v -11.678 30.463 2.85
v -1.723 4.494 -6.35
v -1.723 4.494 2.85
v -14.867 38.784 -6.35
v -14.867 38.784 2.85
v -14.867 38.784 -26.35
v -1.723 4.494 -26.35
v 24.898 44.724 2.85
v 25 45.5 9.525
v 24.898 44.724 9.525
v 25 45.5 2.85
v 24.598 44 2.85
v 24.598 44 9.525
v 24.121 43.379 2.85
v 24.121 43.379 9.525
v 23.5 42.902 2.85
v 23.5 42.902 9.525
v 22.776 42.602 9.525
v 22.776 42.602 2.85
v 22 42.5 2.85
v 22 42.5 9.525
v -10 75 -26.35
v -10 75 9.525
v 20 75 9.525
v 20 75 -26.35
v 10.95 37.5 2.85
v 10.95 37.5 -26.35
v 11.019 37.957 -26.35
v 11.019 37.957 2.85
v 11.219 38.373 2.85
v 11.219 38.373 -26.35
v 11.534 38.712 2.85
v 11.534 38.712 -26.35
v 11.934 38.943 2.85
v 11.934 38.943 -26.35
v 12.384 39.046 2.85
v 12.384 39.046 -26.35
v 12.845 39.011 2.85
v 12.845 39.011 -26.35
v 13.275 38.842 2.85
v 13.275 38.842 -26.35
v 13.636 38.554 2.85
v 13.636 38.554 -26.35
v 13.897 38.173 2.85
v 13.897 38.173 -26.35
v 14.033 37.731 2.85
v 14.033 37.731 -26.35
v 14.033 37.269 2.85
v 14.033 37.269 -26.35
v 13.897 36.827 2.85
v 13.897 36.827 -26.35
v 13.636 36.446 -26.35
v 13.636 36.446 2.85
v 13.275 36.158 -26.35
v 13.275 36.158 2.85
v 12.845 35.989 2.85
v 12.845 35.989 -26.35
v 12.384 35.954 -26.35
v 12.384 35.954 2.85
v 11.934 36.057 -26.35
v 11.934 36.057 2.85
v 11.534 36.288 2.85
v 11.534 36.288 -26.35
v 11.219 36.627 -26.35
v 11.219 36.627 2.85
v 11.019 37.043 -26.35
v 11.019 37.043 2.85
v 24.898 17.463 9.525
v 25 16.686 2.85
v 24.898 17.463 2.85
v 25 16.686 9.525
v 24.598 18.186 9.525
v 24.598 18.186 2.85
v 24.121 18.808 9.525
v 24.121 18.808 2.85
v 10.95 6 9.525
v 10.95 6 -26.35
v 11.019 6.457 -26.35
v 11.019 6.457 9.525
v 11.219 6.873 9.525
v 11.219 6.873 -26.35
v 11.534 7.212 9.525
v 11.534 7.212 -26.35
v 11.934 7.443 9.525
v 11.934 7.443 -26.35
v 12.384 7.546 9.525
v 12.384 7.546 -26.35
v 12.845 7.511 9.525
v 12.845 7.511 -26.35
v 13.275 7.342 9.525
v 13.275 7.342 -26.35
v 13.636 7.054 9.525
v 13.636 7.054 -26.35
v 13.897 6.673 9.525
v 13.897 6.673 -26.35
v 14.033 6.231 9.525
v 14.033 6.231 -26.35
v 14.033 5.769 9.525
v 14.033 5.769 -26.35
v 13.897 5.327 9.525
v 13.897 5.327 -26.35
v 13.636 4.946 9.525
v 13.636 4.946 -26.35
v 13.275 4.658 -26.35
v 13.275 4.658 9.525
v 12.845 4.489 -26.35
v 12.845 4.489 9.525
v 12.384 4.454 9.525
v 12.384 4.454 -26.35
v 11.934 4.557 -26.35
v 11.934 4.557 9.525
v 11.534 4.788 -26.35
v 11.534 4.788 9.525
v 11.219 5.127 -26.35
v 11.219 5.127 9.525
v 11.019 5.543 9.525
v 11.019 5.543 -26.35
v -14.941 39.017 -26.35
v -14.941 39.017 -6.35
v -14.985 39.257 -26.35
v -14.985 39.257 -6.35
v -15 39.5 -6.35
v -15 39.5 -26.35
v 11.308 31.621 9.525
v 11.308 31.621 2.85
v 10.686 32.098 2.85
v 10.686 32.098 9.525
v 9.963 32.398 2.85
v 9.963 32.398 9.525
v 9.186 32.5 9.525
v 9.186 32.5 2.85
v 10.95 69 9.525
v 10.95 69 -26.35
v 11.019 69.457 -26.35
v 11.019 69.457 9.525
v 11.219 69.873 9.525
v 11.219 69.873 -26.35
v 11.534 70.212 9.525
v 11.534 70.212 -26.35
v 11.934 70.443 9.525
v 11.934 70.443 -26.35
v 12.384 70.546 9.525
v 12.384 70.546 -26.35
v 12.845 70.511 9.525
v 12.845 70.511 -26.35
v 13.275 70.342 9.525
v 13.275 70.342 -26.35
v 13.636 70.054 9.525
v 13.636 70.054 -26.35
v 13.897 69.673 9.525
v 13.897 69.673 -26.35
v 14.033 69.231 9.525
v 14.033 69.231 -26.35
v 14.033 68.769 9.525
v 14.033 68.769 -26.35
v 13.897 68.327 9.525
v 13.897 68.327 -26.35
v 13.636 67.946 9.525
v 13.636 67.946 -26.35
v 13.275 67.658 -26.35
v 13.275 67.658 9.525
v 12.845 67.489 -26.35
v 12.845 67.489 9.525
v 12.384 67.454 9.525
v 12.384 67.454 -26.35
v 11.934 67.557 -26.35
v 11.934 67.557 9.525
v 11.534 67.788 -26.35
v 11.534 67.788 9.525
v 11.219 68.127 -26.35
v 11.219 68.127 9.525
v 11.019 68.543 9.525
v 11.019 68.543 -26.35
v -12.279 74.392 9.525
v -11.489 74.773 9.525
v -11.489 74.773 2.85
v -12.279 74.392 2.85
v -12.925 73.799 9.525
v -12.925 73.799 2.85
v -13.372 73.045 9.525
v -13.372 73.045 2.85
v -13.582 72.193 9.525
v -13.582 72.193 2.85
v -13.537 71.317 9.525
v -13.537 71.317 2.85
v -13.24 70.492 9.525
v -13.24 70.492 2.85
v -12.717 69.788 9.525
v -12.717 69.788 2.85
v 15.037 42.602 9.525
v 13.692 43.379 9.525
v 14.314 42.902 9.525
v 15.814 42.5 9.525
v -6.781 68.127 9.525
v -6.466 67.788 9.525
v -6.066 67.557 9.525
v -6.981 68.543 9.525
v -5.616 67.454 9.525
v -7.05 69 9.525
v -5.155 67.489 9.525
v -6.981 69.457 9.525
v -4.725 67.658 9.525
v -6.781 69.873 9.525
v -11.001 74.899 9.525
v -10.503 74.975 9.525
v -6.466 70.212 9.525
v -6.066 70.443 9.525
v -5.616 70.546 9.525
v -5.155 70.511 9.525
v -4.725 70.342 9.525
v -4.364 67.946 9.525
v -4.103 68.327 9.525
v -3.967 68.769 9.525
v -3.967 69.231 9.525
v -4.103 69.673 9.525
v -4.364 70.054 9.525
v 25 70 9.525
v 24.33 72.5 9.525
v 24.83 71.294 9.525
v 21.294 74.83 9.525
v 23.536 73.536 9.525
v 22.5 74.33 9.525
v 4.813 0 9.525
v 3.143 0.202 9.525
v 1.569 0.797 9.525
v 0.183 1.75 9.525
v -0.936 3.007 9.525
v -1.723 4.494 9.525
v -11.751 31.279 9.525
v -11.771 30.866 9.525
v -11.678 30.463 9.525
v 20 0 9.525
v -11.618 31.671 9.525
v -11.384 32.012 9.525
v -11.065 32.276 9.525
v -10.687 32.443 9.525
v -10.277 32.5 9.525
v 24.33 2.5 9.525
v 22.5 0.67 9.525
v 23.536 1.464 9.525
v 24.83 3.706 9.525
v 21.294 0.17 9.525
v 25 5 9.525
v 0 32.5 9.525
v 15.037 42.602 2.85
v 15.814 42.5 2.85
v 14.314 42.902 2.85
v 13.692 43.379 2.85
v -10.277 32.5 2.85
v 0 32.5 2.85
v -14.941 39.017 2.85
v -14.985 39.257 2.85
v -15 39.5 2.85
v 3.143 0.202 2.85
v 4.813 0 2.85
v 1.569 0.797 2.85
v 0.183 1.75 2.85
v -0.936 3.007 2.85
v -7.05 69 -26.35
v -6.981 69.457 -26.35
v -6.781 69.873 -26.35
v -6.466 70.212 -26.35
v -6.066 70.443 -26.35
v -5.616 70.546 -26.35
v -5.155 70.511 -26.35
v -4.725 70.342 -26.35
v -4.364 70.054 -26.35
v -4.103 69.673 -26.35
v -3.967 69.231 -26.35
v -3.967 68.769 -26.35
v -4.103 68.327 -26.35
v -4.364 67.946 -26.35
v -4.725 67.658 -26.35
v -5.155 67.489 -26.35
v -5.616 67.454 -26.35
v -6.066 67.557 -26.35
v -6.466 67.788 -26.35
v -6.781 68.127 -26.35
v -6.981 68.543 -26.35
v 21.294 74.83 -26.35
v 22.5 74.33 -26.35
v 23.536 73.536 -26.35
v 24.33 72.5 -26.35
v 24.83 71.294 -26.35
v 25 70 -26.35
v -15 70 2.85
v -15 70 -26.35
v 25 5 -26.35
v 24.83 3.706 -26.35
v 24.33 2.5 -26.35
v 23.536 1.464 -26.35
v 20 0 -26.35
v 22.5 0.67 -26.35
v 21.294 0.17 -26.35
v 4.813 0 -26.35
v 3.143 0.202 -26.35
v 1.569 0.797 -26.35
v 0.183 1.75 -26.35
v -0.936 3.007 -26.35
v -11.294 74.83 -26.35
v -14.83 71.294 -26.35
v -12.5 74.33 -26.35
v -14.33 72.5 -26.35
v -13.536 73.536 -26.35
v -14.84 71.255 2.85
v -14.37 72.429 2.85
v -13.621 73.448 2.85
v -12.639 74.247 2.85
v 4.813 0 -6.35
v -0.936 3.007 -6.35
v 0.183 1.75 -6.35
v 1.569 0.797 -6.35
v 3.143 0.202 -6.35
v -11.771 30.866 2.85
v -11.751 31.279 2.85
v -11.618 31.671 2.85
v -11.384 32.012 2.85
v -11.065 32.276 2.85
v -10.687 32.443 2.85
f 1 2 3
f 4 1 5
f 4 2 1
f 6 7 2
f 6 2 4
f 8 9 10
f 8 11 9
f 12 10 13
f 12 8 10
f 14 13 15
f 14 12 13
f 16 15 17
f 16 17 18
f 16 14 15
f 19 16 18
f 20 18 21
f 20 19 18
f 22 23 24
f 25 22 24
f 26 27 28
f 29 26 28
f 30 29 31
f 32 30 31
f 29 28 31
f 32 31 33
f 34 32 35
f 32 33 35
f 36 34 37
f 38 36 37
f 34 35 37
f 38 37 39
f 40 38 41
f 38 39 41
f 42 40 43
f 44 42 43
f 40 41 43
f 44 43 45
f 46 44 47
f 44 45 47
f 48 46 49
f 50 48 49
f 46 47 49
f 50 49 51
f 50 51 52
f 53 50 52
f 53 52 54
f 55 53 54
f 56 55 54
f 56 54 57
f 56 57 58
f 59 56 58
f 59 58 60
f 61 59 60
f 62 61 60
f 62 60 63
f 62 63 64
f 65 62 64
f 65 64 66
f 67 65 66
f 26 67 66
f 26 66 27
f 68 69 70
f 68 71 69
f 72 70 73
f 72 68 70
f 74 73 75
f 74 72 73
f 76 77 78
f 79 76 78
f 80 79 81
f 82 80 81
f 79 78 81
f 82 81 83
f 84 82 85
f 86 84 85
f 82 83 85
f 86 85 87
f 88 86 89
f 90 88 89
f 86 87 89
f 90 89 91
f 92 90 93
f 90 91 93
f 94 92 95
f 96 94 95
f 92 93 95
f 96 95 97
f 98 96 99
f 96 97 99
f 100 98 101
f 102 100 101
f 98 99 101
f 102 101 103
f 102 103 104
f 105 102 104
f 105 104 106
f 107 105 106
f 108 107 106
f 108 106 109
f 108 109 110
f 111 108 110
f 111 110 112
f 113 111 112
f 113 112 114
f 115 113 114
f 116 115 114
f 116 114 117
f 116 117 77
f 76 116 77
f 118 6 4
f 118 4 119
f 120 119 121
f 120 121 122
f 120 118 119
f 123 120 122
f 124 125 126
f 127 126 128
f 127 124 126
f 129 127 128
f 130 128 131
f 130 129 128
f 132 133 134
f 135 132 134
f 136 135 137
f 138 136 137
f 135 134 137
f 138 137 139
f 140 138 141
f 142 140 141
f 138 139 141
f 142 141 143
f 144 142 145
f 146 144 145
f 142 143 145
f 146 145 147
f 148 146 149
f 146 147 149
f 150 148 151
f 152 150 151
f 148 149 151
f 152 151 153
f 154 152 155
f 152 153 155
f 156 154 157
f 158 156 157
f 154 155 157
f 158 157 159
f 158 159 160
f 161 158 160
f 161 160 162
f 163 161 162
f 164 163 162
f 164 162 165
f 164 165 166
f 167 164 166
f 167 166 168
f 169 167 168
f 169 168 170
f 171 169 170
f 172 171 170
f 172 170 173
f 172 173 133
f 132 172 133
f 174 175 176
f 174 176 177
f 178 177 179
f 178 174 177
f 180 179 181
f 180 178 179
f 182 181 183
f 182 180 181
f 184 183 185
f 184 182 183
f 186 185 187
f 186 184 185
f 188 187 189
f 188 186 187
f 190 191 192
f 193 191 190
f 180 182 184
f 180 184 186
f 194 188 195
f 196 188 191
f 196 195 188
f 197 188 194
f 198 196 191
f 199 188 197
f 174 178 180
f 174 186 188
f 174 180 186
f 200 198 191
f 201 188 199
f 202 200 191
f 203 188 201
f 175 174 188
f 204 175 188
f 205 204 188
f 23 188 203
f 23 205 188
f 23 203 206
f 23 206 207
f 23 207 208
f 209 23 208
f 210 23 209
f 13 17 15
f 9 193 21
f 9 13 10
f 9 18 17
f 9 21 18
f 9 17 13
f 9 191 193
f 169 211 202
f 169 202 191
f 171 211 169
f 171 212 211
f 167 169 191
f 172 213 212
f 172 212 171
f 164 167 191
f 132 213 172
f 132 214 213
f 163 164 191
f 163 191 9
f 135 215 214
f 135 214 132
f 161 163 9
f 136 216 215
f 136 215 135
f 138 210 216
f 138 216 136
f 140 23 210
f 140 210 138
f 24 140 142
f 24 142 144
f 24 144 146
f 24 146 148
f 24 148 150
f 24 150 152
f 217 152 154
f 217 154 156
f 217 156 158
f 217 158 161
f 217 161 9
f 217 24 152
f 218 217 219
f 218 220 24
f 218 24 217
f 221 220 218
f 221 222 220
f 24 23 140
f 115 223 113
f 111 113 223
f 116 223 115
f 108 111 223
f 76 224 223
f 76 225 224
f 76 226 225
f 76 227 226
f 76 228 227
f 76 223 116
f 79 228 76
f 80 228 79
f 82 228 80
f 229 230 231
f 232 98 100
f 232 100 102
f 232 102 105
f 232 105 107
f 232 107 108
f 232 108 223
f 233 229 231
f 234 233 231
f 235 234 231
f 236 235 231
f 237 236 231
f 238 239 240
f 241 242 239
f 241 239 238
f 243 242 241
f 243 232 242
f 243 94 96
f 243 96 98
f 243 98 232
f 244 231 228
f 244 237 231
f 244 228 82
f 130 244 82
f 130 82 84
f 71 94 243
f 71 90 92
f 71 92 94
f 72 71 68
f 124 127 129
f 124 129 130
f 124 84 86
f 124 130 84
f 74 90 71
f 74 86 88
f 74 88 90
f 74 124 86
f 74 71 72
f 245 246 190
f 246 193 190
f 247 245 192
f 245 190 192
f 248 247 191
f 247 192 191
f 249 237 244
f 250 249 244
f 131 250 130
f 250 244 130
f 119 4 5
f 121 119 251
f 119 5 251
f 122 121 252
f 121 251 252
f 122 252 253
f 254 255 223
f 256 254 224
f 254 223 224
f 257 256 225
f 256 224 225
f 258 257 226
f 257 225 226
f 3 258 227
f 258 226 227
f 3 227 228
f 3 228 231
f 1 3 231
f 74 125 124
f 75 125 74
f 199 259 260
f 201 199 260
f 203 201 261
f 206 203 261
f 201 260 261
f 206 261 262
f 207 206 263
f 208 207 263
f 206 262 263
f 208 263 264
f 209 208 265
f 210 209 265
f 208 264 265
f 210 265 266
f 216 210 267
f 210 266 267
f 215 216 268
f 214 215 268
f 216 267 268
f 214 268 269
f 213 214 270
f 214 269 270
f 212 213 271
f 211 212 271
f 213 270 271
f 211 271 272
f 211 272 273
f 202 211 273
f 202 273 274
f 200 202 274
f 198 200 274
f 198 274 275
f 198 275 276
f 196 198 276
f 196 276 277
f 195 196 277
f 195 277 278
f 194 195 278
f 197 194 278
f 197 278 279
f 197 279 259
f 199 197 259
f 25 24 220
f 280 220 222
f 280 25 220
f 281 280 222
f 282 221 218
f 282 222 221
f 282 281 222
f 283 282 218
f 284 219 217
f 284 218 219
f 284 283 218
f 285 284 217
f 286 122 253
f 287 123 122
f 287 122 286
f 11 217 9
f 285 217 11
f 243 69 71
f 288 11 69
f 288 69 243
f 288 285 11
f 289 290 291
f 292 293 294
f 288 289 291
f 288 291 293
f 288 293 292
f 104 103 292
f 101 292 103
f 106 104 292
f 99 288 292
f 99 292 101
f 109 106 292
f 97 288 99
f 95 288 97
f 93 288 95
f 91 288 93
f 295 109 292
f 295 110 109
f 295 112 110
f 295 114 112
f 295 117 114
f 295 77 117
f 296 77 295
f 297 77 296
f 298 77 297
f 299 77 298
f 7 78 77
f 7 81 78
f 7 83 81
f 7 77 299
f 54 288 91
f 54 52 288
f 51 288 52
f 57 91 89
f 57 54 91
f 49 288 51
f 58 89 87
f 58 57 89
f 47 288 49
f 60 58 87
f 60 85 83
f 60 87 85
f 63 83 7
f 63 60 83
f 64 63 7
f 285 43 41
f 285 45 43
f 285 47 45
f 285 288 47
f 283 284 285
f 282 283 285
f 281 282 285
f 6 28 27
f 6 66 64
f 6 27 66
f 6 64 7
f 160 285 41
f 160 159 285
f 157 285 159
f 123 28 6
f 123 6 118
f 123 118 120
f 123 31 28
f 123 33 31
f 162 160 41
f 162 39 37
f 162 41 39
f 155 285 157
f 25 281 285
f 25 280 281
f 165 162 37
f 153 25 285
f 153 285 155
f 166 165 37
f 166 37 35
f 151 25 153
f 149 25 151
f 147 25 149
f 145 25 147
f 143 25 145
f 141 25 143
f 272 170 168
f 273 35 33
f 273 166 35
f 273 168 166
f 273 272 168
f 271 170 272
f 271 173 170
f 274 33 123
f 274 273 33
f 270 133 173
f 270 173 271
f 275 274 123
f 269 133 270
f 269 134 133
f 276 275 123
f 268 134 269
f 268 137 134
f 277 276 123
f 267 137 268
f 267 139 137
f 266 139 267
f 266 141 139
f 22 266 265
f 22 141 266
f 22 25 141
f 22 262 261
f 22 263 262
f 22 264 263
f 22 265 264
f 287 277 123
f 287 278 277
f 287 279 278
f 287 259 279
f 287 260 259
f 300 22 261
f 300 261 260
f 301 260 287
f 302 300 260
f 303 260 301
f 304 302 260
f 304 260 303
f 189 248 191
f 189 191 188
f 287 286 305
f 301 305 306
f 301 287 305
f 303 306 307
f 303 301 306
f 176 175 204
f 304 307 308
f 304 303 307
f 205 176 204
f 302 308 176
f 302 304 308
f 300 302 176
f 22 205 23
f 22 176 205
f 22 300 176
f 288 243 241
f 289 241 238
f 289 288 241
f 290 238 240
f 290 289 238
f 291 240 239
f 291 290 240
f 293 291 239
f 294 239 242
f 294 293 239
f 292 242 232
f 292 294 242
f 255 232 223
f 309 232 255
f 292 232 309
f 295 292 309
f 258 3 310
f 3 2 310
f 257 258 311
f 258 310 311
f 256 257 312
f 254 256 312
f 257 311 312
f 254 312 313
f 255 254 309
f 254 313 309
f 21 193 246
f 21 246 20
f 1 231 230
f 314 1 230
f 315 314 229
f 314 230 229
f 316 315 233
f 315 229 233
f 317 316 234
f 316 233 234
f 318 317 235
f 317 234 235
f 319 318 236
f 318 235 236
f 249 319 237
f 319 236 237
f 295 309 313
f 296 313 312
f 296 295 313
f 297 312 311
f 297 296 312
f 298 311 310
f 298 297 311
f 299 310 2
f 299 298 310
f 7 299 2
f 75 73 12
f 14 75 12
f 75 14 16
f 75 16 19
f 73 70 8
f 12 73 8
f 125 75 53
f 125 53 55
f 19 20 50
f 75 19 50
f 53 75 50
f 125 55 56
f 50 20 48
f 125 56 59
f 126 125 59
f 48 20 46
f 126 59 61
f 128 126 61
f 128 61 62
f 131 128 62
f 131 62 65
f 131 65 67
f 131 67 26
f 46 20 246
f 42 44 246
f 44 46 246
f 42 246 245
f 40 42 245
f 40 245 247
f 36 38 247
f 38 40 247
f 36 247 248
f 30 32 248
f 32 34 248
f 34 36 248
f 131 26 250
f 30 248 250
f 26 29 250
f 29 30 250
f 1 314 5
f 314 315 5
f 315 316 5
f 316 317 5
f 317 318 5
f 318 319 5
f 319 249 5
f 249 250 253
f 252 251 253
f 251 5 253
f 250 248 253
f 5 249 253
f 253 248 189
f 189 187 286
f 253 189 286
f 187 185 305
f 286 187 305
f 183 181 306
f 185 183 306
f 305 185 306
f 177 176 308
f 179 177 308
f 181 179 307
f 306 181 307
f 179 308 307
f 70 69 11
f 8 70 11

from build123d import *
from build123d.topology import SkipClean

# Parameters (mm, degrees)
SKETCH1_R           = 1.5
SKETCH1_W           = 15
SKETCH1_H           = 37.5
BOSS_EXTRUDE1_DEPTH = 2.85
FILLET1_R           = 5
FILLET2_R           = 2
BOSS_EXTRUDE2_START = 3.5
SKETCH5_R           = 1.5
BOSS_EXTRUDE2_DEPTH = 3.5
FILLET3_R           = 3.5
FILLET4_R           = 2
FILLET5_R           = 2
SKETCH6_R           = 1.5
CUT_EXTRUDE1_DEPTH  = 10
SKETCH8_R           = 1.5
BOSS_EXTRUDE3_DEPTH = 6.35
BOSS_EXTRUDE4_START = 3.175
SKETCH9_R           = 1.5
BOSS_EXTRUDE4_DEPTH = 3.175
SKETCH10_W          = 40
SKETCH10_H          = 15.399494937
SKETCH10_W_2        = 25
BOSS_EXTRUDE5_DEPTH = 6.675
CUT_EXTRUDE2_START  = -6.675
CUT_EXTRUDE2_DEPTH  = 6.675
BOSS_EXTRUDE6_START = -9.2
BOSS_EXTRUDE6_DEPTH = 9.2
FILLET6_R           = 7
BOSS_EXTRUDE7_DEPTH = 6.675
FILLET7_R           = 3
FILLET8_R           = 1.5
SKETCH14_R          = 1.5
CUT_EXTRUDE3_DEPTH  = 81.63507689
SKETCH15_R          = 1.55
CUT_EXTRUDE4_DEPTH  = 81.63507689
BOSS_EXTRUDE8_START = 20
SKETCH16_R          = 1.55
BOSS_EXTRUDE8_DEPTH = 20


# Read off the part's stored shape, not the designer's step: Cut-Extrude2
with BuildPart() as part:
    # Sketch1 → Boss-Extrude1 (new body)
    # profile 1 of 2: a face of its own
    with BuildSketch(Plane.XY):
        Polygon((0, 37.5), (0, 0), (25, 0), (25, 75), (0, 75), align=None)
        with Locations((12.5, 6)):
            Circle(SKETCH1_R, mode=Mode.SUBTRACT)
        with Locations((12.5, 37.5)):
            Circle(SKETCH1_R, mode=Mode.SUBTRACT)
        with Locations((12.5, 69)):
            Circle(SKETCH1_R, mode=Mode.SUBTRACT)
    # profile 2 of 2: a face of its own
    with BuildSketch(Plane.XY):
        with Locations((-7.5, 56.25)):
            Rectangle(SKETCH1_W, SKETCH1_H)
    extrude(amount=BOSS_EXTRUDE1_DEPTH)

    # Fillet1
    fillet1_edges = [part.edges().sort_by_distance(p)[0] for p in [
        (25, 75, 1.425),
        (25, 0, 1.425),
        (0, 0, 1.425),
        (0, 37.5, 1.425),
        (-15, 75, 1.425),
    ]]
    fillet(fillet1_edges, radius=FILLET1_R)

    # Fillet2
    fillet2_edges = [part.edges().sort_by_distance(p)[0] for p in [
        (-15, 37.5, 1.425),
    ]]
    fillet(fillet2_edges, radius=FILLET2_R)

    # Sketch5 → Boss-Extrude2 (add)
    # profile 1 of 2: a face of its own
    with BuildSketch(Plane.XY.offset(2.85).offset(BOSS_EXTRUDE2_START)):
        with BuildLine():
            Line((-15, 42.5), (10.428932188, 42.5))
            Line((10.428932188, 42.5), (21.464466094, 53.535533906))
            Line((21.464466094, 53.535533906), (25, 57.071067812))
            Line((25, 57.071067812), (25, 70))
            ThreePointArc((25, 70), (23.535533906, 73.535533906), (20, 75))
            Line((20, 75), (-10, 75))
            ThreePointArc((-10, 75), (-13.535533906, 73.535533906), (-15, 70))
            Line((-15, 70), (-15, 42.5))
        make_face()
        with Locations((12.5, 69)):
            Circle(SKETCH5_R, mode=Mode.SUBTRACT)
    # profile 2 of 2: a face of its own
    with BuildSketch(Plane.XY.offset(2.85).offset(BOSS_EXTRUDE2_START)):
        with BuildLine():
            Line((14.571067812, 32.5), (0, 17.928932188))
            Line((0, 17.928932188), (0, 5))
            ThreePointArc((0, 5), (1.464466094, 1.464466094), (5, 0))
            Line((5, 0), (20, 0))
            ThreePointArc((20, 0), (23.535533906, 1.464466094), (25, 5))
            Line((25, 5), (25, 32.5))
            Line((25, 32.5), (14.571067812, 32.5))
        make_face()
        with Locations((12.5, 6)):
            Circle(SKETCH5_R, mode=Mode.SUBTRACT)
    extrude(amount=-BOSS_EXTRUDE2_DEPTH)

    # Fillet3
    fillet3_edges = [part.edges().sort_by_distance(p)[0] for p in [
        (10.428932188, 42.5, 4.6),
        (14.571067812, 32.5, 4.6),
    ]]
    fillet(fillet3_edges, radius=FILLET3_R)

    # Fillet4
    fillet4_edges = [part.edges().sort_by_distance(p)[0] for p in [
        (-15, 42.5, 4.6),
    ]]
    fillet(fillet4_edges, radius=FILLET4_R)

    # Fillet5
    fillet5_edges = [part.edges().sort_by_distance(p)[0] for p in [
        (25, 57.071067812, 4.6),
        (25, 32.5, 4.6),
        (0, 17.928932188, 4.6),
    ]]
    fillet(fillet5_edges, radius=FILLET5_R)

    # Sketch6 → Cut-Extrude1 (cut)
    with BuildSketch(Plane.XY.offset(6.35)):
        with Locations((-5.5, 69)):
            Circle(SKETCH6_R)
    extrude(amount=-CUT_EXTRUDE1_DEPTH, mode=Mode.SUBTRACT)

    # Sketch8 → Boss-Extrude3 (add)
    with SkipClean():  # the faces are left unmerged after this step: merging them gives an invalid solid
        with BuildSketch(Plane(origin=(0, 0, 0), x_dir=(-1, 0, 0), z_dir=(0, 0, -1))):
            with BuildLine():
                ThreePointArc((0, 32.5), (1.464466094, 36.035533906), (5, 37.5))
                Line((5, 37.5), (13, 37.5))
                ThreePointArc((13, 37.5), (14.414213562, 38.085786438), (15, 39.5))
                Line((15, 39.5), (15, 70))
                ThreePointArc((15, 70), (13.535533906, 73.535533906), (10, 75))
                Line((10, 75), (-20, 75))
                ThreePointArc((-20, 75), (-23.535533906, 73.535533906), (-25, 70))
                Line((-25, 70), (-25, 5))
                ThreePointArc((-25, 5), (-23.535533906, 1.464466094), (-20, 0))
                Line((-20, 0), (-5, 0))
                ThreePointArc((-5, 0), (-1.464466094, 1.464466094), (0, 5))
                Line((0, 5), (0, 32.5))
            make_face()
            with Locations((-12.5, 6)):
                Circle(SKETCH8_R, mode=Mode.SUBTRACT)
            with Locations((-12.5, 69)):
                Circle(SKETCH8_R, mode=Mode.SUBTRACT)
            with Locations((-12.5, 37.5)):
                Circle(SKETCH8_R, mode=Mode.SUBTRACT)
            with Locations(Location((5.5, 69, 0), (0, 0, 180))):
                Circle(SKETCH8_R, mode=Mode.SUBTRACT)
        extrude(amount=BOSS_EXTRUDE3_DEPTH)
    add(part.part.scale(1), mode=Mode.REPLACE)  # the faces are merged on a copy

    # Sketch9 → Boss-Extrude4 (add)
    # profile 1 of 2: a face of its own
    with BuildSketch(Plane.XY.offset(6.35).offset(BOSS_EXTRUDE4_START)):
        with BuildLine():
            ThreePointArc((16.02081528, 32.5), (14.681423267, 32.233578364), (13.545941546, 31.474873734))
            Line((13.545941546, 31.474873734), (0.585786438, 18.514718626))
            ThreePointArc((0.585786438, 18.514718626), (0.152240935, 17.865871928), (0, 17.100505063))
            Line((0, 17.100505063), (0, 5))
            ThreePointArc((0, 5), (1.464466094, 1.464466094), (5, 0))
            Line((5, 0), (20, 0))
            ThreePointArc((20, 0), (23.535533906, 1.464466094), (25, 5))
            Line((25, 5), (25, 30.5))
            ThreePointArc((25, 30.5), (24.414213562, 31.914213562), (23, 32.5))
            Line((23, 32.5), (16.02081528, 32.5))
        make_face()
    # profile 2 of 2: a face of its own
    with BuildSketch(Plane.XY.offset(6.35).offset(BOSS_EXTRUDE4_START)):
        with BuildLine():
            ThreePointArc((8.97918472, 42.5), (10.318576733, 42.766421636), (11.454058454, 43.525126266))
            Line((11.454058454, 43.525126266), (24.414213562, 56.485281374))
            ThreePointArc((24.414213562, 56.485281374), (24.847759065, 57.134128072), (25, 57.899494937))
            Line((25, 57.899494937), (25, 70))
            ThreePointArc((25, 70), (23.535533906, 73.535533906), (20, 75))
            Line((20, 75), (-10, 75))
            ThreePointArc((-10, 75), (-13.535533906, 73.535533906), (-15, 70))
            Line((-15, 70), (-15, 44.5))
            ThreePointArc((-15, 44.5), (-14.414213562, 43.085786438), (-13, 42.5))
            Line((-13, 42.5), (8.97918472, 42.5))
        make_face()
        with Locations((-5.5, 69)):
            Circle(SKETCH9_R, mode=Mode.SUBTRACT)
        with Locations((12.5, 69)):
            Circle(SKETCH9_R, mode=Mode.SUBTRACT)
    extrude(amount=-BOSS_EXTRUDE4_DEPTH)

    # Sketch10 → Boss-Extrude5 (add)
    with SkipClean():  # the faces are left unmerged after this step: merging them gives an invalid solid
        with BuildSketch(Plane.XY.offset(9.525)):
            with Locations((5, 50.199747469)):
                Rectangle(SKETCH10_W, SKETCH10_H)
            with Locations((12.5, 24.800252531)):
                Rectangle(SKETCH10_W_2, SKETCH10_H)
        extrude(amount=-BOSS_EXTRUDE5_DEPTH)

    # Cut-Extrude2 outline → Cut-Extrude2 (cut)
    with SkipClean():  # the faces are left unmerged after this step: merging them gives an invalid solid
        with BuildSketch(Plane.XY.offset(9.525).offset(CUT_EXTRUDE2_START)):
            Polygon((25, 32.5), (10.428932188, 32.5), (25, 17.928932188), align=None)
            with BuildLine():
                Line((-15, 42.5), (14.571067812, 42.5))
                Line((14.571067812, 42.5), (-14.682437359, 71.75350517))
                ThreePointArc((-14.682437359, 71.75350517), (-14.919968841, 70.891014367), (-15, 70))
                Line((-15, 70), (-15, 42.5))
            make_face()
        extrude(amount=CUT_EXTRUDE2_DEPTH, mode=Mode.SUBTRACT)

    # Sketch12 → Boss-Extrude6 (add)
    with BuildSketch(Plane(origin=(0, 0, -6.35), x_dir=(-1, 0, 0), z_dir=(0, 0, -1)).offset(BOSS_EXTRUDE6_START)):
        with BuildLine():
            Line((0, 0), (14.867488321, 38.784117768))
            ThreePointArc((14.867488321, 38.784117768), (14.133189202, 37.852006604), (13, 37.5))
            Line((13, 37.5), (5, 37.5))
            ThreePointArc((5, 37.5), (1.464466094, 36.035533906), (0, 32.5))
            Line((0, 32.5), (0, 5))
            ThreePointArc((0, 5), (-1.464466094, 1.464466094), (-5, 0))
            Line((-5, 0), (0, 0))
        make_face()
    extrude(amount=BOSS_EXTRUDE6_DEPTH)

    # Fillet6
    fillet6_edges = [part.edges().sort_by_distance(p)[0] for p in [
        (0, 0, -1.75),
    ]]
    fillet(fillet6_edges, radius=FILLET6_R)

    # Sketch13 → Boss-Extrude7 (add)
    with SkipClean():  # the faces are left unmerged after this step: merging them gives an invalid solid
        with BuildSketch(Plane.XY.offset(9.525)):
            with BuildLine():
                Line((0, 32.5), (0, 5))
                ThreePointArc((0, 5), (1.464466094, 1.464466094), (5, 0))
                Line((5, 0), (4.813322939, 0))
                ThreePointArc((4.813322939, 0), (0.847160732, 1.232023115), (-1.722886185, 4.494412187))
                Line((-1.722886185, 4.494412187), (-12.458537109, 32.5))
                Line((-12.458537109, 32.5), (0, 32.5))
            make_face()
        extrude(amount=-BOSS_EXTRUDE7_DEPTH)

    # Fillet7
    fillet7_edges = [part.edges().sort_by_distance(p)[0] for p in [
        (25, 42.5, 6.1875),
        (14.571067812, 42.5, 6.1875),
        (-14.682437359, 71.75350517, 4.6),
        (10.428932188, 32.5, 6.1875),
        (25, 17.928932188, 6.1875),
    ]]
    fillet(fillet7_edges, radius=FILLET7_R)

    # Fillet8
    # the kernel refuses this fillet: 1.5 mm, written as the material it takes off along each edge
    with BuildSketch(Plane(origin=(-12.458537109, 32.5, 14.978612885), x_dir=(0.35794111613384066, -0.9337441605605148, 0), z_dir=(0, 0, -1))) as fillet8_piece_1:
        with BuildLine():
            CenterArc((FILLET8_R * 1.45429676938, -FILLET8_R), FILLET8_R, 90, 110.97380664)
            Line((FILLET8_R * 0.520552608823, -FILLET8_R * 1.35794111613), (0, 0))
            Line((0, 0), (FILLET8_R * 1.45429676938, 0))
        make_face()
    extrude(amount=12.128612885, mode=Mode.SUBTRACT)

    # Sketch14 → Cut-Extrude3 (cut, through all)
    with SkipClean():  # the faces are left unmerged after this step: merging them gives an invalid solid
        with BuildSketch(Plane(origin=(0, 0, -6.35), x_dir=(-1, 0, 0), z_dir=(0, 0, -1))):
            with Locations((-12.5, 6)):
                Circle(SKETCH14_R)
        extrude(amount=-CUT_EXTRUDE3_DEPTH, mode=Mode.SUBTRACT)
    add(part.part.scale(1), mode=Mode.REPLACE)  # the faces are merged on a copy

    # Sketch15 → Cut-Extrude4 (cut, through all)
    with BuildSketch(Plane(origin=(0, 0, -6.35), x_dir=(-1, 0, 0), z_dir=(0, 0, -1))):
        with Locations((-12.5, 69)):
            Circle(SKETCH15_R)
        with Locations((5.5, 69)):
            Circle(SKETCH15_R)
        with Locations((-12.5, 37.5)):
            Circle(SKETCH15_R)
        with Locations((-12.5, 6)):
            Circle(SKETCH15_R)
    extrude(amount=-CUT_EXTRUDE4_DEPTH, mode=Mode.SUBTRACT)

    # Sketch16 → Boss-Extrude8 (add)
    with BuildSketch(Plane(origin=(0, 0, -6.35), x_dir=(-1, 0, 0), z_dir=(0, 0, -1)).offset(BOSS_EXTRUDE8_START)):
        with BuildLine():
            Line((-20, 0), (-4.813322939, 0))
            ThreePointArc((-4.813322939, 0), (-0.847160732, 1.232023115), (1.722886185, 4.494412187))
            Line((1.722886185, 4.494412187), (14.867488321, 38.784117768))
            ThreePointArc((14.867488321, 38.784117768), (14.966593075, 39.135978464), (15, 39.5))
            Line((15, 39.5), (15, 70))
            ThreePointArc((15, 70), (13.535533906, 73.535533906), (10, 75))
            Line((10, 75), (-20, 75))
            ThreePointArc((-20, 75), (-23.535533906, 73.535533906), (-25, 70))
            Line((-25, 70), (-25, 5))
            ThreePointArc((-25, 5), (-23.535533906, 1.464466094), (-20, 0))
        make_face()
        with Locations((-12.5, 6)):
            Circle(SKETCH16_R, mode=Mode.SUBTRACT)
        with Locations((-12.5, 37.5)):
            Circle(SKETCH16_R, mode=Mode.SUBTRACT)
        with Locations((5.5, 69)):
            Circle(SKETCH16_R, mode=Mode.SUBTRACT)
        with Locations((-12.5, 69)):
            Circle(SKETCH16_R, mode=Mode.SUBTRACT)
    extrude(amount=-BOSS_EXTRUDE8_DEPTH)


solid = part.part
